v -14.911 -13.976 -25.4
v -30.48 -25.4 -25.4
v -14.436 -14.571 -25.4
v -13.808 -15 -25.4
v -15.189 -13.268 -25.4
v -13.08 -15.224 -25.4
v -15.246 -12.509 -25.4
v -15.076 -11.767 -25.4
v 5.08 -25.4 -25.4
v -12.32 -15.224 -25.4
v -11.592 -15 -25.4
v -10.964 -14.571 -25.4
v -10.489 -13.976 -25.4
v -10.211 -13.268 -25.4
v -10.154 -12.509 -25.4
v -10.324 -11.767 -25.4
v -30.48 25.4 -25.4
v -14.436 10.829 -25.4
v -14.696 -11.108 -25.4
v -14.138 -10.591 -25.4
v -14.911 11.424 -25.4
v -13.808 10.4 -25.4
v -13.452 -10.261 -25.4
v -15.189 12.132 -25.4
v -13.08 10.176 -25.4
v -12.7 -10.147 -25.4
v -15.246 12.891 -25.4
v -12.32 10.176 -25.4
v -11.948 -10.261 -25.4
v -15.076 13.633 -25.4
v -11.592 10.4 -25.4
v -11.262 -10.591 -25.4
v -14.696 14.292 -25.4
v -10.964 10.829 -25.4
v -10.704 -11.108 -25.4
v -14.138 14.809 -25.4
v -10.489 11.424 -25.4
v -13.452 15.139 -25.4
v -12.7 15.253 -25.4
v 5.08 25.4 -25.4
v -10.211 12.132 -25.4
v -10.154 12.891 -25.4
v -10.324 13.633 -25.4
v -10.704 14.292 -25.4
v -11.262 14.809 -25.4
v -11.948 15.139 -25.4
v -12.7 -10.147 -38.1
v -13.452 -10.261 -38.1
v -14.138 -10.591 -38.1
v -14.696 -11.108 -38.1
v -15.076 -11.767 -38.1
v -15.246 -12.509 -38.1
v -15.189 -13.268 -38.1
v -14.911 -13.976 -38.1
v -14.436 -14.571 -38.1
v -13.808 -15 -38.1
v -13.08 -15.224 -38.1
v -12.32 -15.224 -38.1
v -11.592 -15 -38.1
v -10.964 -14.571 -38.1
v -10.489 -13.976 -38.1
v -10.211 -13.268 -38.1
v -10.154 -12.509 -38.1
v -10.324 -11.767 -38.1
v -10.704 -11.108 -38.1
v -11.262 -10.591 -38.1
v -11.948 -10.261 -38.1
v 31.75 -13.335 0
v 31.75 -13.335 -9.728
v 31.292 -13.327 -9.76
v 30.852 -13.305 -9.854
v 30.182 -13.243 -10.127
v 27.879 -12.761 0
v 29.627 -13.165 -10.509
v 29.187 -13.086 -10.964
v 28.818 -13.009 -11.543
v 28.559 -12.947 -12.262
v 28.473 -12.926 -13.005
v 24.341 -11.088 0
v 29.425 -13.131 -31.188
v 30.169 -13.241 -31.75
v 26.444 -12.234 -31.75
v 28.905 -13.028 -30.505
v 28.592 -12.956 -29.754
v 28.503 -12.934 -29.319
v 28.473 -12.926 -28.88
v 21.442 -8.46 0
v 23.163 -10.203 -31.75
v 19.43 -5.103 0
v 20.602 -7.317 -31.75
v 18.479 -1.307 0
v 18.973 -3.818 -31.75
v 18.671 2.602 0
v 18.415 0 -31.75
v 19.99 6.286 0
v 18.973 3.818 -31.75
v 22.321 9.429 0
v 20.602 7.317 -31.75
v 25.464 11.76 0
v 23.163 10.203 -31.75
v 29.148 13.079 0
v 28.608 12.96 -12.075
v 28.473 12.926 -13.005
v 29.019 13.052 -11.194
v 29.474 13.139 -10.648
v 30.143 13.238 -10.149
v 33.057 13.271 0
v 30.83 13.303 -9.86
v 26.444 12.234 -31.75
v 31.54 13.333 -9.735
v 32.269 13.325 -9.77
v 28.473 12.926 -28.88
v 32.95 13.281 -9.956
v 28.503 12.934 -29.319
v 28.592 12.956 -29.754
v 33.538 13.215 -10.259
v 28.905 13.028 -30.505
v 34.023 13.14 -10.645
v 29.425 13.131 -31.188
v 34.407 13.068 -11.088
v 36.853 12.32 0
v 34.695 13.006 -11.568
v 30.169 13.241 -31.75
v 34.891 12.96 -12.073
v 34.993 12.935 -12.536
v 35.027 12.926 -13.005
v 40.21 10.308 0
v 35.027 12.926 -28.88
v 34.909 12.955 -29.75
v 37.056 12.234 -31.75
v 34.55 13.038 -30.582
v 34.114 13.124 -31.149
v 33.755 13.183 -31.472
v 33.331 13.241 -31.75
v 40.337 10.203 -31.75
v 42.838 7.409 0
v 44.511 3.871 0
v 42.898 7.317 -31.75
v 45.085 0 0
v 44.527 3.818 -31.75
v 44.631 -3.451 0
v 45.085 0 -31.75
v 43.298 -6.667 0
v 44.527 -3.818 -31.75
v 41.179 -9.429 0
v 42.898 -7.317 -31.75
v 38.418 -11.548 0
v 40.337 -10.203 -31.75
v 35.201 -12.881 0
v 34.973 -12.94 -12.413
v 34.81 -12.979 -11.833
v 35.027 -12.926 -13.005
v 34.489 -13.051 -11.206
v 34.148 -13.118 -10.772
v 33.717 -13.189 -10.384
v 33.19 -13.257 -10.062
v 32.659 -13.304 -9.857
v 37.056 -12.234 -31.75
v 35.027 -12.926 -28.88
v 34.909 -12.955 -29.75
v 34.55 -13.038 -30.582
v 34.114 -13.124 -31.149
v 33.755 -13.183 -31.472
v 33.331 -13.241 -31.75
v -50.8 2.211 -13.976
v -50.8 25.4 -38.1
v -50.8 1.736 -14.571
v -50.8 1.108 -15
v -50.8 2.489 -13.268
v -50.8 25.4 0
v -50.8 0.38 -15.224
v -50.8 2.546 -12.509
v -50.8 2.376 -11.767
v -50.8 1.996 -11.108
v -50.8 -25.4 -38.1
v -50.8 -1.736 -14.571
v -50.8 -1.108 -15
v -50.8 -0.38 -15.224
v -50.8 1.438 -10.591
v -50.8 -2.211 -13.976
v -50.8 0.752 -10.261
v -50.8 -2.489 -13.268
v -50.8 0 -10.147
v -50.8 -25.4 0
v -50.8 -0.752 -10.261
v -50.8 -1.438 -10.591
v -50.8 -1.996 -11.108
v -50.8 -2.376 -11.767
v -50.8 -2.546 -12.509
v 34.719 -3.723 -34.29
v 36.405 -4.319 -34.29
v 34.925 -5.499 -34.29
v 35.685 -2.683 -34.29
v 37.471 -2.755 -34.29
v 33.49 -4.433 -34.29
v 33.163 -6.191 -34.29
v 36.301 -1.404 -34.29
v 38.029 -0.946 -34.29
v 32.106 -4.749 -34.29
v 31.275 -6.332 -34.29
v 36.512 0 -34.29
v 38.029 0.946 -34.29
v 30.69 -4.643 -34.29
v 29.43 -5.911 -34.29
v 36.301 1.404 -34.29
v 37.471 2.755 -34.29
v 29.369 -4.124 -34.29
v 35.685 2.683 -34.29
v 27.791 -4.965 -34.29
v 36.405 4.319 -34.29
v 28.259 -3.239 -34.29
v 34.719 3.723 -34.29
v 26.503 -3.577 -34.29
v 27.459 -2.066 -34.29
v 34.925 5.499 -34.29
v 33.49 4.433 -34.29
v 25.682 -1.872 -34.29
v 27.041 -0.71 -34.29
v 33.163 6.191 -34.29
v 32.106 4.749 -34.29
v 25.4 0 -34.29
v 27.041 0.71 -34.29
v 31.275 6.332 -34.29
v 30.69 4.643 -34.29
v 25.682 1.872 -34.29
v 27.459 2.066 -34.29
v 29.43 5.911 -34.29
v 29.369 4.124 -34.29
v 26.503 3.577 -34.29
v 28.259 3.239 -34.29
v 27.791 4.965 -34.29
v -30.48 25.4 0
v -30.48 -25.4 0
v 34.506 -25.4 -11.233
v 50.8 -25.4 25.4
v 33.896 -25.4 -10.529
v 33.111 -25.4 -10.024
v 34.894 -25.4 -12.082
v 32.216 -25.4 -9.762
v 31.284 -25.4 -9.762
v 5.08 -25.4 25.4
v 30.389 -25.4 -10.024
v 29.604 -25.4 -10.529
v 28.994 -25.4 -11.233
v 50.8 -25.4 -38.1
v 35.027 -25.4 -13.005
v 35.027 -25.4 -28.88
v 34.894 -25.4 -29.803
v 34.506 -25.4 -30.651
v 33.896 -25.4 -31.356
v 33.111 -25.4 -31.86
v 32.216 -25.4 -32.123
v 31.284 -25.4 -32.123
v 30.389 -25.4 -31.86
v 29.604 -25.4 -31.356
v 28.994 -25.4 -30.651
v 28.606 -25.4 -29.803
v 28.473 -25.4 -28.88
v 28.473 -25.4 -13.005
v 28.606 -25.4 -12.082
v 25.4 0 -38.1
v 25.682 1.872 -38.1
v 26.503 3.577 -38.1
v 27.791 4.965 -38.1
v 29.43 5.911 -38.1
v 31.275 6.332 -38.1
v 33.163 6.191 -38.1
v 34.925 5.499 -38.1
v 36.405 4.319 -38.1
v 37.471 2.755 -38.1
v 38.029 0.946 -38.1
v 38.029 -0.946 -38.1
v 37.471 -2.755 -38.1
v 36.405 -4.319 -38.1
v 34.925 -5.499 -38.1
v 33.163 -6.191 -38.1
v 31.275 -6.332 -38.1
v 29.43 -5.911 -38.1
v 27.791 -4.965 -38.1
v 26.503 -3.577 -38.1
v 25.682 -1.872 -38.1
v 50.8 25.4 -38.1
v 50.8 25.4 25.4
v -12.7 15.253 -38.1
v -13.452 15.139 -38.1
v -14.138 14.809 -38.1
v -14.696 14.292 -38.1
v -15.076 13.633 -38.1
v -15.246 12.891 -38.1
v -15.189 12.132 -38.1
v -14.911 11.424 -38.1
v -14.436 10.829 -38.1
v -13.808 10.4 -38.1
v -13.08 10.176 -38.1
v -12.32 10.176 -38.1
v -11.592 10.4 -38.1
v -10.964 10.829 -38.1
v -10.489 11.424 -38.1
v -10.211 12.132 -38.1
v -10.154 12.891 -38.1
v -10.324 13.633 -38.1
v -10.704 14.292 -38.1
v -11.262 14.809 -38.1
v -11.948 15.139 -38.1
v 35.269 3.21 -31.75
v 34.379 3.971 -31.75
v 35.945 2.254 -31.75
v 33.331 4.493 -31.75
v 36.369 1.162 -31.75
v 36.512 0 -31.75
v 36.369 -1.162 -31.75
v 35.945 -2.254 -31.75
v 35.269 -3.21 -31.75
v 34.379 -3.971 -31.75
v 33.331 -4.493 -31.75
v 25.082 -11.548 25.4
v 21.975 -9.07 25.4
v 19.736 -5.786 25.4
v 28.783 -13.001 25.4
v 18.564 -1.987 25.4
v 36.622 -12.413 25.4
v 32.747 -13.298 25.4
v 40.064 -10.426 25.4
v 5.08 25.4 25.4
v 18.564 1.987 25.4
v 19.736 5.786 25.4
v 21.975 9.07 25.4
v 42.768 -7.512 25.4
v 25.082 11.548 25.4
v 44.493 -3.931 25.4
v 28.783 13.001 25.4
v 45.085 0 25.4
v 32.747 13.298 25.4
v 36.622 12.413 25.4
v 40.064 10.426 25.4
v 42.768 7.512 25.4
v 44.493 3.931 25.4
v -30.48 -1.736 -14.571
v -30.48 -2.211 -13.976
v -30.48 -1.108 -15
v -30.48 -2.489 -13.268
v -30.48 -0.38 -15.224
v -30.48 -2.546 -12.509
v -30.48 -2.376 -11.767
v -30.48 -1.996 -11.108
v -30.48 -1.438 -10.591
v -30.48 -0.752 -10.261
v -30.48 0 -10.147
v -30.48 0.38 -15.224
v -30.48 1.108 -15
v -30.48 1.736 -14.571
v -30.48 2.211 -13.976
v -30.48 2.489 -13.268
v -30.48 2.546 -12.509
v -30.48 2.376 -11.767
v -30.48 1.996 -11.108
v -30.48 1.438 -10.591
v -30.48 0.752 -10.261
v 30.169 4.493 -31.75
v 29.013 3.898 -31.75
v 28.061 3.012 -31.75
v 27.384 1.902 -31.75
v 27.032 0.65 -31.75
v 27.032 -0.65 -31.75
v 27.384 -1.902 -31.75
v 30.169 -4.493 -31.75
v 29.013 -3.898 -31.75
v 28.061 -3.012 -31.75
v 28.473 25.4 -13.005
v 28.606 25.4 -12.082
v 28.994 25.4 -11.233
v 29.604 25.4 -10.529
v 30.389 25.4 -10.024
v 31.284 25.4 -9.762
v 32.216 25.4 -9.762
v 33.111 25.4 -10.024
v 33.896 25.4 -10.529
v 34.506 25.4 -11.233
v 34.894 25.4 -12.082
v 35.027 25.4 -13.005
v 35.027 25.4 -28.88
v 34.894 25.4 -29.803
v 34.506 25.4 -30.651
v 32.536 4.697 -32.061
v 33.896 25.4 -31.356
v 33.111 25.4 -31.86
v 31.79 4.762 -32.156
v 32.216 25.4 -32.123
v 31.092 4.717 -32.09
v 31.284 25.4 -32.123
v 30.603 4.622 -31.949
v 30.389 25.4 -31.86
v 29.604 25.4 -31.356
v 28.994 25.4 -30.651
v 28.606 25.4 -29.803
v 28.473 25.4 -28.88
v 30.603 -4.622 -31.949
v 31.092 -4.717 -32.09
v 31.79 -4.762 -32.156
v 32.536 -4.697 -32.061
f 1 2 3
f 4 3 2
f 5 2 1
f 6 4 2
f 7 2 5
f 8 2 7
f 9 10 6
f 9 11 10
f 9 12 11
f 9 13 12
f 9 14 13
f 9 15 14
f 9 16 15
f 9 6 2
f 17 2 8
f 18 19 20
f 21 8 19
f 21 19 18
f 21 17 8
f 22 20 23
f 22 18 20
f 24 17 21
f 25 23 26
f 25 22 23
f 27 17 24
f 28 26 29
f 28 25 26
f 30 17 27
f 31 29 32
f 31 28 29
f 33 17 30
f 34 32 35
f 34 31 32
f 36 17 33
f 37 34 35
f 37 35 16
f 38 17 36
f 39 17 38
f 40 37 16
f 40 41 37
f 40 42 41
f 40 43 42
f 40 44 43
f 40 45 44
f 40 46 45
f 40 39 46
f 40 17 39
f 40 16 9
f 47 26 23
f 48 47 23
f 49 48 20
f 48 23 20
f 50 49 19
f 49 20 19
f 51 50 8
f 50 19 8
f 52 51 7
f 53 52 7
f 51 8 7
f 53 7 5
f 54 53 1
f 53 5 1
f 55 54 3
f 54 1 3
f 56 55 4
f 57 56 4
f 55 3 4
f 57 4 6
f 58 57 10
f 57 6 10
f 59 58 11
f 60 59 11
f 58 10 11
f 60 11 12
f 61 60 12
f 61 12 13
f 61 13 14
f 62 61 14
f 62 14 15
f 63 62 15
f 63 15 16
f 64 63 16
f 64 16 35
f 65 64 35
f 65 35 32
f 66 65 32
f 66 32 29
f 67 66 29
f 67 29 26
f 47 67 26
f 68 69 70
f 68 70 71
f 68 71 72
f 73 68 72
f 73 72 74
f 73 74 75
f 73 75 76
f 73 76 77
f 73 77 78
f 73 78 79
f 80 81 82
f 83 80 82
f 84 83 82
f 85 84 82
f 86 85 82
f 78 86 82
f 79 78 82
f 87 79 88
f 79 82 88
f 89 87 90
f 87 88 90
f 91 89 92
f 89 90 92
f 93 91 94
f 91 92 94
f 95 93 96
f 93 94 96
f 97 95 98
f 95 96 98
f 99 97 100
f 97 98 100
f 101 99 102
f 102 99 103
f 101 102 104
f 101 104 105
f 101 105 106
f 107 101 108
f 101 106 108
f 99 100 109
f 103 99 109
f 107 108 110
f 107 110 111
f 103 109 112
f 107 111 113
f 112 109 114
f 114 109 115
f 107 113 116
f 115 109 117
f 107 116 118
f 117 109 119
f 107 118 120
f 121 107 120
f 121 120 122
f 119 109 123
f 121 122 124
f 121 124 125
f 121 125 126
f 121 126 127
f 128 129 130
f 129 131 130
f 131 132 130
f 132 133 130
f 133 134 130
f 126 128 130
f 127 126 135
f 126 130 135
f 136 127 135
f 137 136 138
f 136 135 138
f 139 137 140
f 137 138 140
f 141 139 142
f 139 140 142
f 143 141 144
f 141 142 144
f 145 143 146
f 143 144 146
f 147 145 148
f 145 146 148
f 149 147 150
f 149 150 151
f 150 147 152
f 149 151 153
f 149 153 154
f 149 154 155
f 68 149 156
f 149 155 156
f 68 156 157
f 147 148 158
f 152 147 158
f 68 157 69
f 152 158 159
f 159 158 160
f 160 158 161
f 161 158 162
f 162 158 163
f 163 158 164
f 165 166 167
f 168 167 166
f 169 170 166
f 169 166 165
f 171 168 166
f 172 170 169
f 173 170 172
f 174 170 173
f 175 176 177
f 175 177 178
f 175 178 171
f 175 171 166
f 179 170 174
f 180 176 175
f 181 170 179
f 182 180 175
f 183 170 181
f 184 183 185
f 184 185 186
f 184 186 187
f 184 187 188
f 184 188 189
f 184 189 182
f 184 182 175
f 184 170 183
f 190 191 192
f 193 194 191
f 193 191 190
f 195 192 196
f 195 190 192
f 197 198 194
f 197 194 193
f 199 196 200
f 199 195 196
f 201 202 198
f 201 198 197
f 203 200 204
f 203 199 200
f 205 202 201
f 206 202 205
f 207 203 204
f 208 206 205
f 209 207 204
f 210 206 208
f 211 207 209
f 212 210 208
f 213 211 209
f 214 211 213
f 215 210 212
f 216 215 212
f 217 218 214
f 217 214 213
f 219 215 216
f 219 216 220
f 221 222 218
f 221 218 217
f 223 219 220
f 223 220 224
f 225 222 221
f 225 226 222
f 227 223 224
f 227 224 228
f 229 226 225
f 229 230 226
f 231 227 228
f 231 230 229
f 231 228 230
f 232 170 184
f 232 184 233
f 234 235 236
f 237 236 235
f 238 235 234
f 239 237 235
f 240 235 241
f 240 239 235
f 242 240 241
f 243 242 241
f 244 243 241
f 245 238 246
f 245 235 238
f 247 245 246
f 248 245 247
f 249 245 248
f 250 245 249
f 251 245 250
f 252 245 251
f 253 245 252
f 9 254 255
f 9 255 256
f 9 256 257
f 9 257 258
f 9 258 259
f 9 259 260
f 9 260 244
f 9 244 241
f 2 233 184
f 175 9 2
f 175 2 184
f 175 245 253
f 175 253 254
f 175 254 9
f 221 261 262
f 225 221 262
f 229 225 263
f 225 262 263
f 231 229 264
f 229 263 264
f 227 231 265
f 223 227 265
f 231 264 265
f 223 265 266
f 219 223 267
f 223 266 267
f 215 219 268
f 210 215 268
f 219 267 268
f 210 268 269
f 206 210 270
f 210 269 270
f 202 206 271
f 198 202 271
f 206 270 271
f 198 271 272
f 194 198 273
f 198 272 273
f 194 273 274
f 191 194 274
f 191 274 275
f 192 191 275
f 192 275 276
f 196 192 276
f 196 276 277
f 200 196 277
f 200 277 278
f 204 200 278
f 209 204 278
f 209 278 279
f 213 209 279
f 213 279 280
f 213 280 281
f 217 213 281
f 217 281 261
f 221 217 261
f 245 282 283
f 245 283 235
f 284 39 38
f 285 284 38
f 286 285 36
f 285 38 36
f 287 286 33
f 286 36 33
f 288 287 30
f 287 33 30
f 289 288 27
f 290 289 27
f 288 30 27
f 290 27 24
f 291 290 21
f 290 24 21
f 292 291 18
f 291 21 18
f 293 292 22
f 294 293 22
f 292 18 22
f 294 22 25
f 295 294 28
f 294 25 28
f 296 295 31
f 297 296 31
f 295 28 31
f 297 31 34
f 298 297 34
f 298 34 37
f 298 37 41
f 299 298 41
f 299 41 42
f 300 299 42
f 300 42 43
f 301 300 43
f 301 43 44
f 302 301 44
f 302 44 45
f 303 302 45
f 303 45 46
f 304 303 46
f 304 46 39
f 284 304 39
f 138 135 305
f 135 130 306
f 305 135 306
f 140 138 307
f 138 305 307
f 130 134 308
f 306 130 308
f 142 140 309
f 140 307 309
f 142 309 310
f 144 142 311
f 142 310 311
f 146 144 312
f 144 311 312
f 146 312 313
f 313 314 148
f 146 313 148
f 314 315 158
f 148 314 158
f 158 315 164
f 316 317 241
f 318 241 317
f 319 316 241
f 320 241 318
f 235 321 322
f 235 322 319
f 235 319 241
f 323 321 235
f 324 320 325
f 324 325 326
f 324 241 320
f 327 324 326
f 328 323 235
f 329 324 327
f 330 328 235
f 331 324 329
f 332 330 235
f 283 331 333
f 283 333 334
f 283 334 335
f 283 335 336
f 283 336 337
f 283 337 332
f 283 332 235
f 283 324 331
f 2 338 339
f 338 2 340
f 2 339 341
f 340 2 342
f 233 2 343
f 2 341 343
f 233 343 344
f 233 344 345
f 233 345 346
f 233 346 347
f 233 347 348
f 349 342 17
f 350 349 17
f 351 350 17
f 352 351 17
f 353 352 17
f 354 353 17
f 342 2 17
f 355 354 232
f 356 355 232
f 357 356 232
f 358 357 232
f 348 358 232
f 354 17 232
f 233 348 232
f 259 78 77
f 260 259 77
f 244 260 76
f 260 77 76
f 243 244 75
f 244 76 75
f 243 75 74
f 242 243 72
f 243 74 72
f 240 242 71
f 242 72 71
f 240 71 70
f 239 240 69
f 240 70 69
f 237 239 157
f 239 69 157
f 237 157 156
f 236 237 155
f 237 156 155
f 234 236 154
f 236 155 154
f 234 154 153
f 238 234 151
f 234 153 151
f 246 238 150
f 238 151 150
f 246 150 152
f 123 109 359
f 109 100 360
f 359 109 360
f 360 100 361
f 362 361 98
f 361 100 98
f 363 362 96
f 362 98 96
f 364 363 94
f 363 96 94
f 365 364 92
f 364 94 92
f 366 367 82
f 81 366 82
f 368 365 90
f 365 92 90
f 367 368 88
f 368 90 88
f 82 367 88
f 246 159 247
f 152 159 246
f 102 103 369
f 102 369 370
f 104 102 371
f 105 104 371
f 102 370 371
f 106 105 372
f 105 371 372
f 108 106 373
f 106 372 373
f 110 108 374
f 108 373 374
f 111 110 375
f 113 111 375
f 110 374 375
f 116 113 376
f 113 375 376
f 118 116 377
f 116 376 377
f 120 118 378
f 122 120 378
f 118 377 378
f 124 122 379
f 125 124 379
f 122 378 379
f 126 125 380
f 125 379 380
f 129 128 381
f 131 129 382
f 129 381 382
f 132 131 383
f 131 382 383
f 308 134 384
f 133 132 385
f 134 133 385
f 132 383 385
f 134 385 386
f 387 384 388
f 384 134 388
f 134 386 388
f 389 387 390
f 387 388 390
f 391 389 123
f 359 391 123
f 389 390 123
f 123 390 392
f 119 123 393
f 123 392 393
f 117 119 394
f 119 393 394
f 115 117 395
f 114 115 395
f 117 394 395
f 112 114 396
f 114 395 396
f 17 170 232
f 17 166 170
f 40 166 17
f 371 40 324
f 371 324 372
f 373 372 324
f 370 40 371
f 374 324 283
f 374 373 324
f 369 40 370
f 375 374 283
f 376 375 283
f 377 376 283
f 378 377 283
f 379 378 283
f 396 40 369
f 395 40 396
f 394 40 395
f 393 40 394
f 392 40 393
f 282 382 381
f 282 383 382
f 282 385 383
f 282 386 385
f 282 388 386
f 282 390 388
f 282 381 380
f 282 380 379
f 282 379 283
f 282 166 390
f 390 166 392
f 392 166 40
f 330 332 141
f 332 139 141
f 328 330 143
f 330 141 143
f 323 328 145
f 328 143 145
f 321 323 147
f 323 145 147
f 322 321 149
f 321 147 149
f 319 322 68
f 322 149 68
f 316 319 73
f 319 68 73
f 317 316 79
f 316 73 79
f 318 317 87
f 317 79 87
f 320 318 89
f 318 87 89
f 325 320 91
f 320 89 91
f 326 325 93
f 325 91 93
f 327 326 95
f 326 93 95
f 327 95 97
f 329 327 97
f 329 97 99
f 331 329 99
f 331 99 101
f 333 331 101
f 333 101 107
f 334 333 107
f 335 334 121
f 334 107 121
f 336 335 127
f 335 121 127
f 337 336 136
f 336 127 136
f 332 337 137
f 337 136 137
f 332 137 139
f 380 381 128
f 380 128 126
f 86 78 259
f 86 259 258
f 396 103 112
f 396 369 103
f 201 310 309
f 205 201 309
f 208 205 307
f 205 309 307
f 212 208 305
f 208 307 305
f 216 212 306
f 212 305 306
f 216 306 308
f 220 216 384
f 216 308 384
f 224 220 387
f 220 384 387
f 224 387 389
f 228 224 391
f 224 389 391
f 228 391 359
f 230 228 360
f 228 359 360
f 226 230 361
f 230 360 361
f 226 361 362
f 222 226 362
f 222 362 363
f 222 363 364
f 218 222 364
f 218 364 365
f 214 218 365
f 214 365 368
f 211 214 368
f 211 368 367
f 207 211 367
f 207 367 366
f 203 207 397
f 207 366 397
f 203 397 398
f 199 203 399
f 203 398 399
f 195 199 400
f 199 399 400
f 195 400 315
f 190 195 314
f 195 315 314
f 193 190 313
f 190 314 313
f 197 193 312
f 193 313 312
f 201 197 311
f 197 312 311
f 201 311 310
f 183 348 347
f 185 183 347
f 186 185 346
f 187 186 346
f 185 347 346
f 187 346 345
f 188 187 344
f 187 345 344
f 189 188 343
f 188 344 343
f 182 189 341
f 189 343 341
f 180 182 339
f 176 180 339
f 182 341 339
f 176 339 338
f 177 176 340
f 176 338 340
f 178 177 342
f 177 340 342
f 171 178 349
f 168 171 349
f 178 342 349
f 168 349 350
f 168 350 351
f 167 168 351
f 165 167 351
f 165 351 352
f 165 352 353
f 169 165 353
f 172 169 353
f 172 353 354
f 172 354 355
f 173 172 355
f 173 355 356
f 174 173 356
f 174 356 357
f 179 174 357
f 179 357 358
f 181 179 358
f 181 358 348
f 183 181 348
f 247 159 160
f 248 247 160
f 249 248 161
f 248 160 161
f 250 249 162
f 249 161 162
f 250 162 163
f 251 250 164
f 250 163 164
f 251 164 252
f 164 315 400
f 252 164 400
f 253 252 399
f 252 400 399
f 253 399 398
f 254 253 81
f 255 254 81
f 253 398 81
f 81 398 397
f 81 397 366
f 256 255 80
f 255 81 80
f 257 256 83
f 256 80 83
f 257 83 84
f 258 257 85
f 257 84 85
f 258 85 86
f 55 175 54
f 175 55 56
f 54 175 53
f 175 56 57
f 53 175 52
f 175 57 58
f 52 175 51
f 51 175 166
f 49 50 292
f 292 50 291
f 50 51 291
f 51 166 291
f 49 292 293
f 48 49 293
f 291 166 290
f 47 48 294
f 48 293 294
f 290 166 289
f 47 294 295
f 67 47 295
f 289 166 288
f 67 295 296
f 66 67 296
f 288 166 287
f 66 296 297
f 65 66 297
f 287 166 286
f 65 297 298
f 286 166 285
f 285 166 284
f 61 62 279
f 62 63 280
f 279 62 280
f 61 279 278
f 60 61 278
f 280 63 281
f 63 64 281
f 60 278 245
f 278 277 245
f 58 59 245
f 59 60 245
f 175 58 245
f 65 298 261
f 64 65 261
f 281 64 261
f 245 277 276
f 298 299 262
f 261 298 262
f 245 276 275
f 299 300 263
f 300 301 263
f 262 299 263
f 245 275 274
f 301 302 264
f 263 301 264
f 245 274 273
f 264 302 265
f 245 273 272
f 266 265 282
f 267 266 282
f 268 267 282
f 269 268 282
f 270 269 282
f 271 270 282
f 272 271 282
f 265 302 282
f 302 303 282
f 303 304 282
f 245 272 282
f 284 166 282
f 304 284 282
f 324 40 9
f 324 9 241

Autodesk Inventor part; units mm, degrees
ref_plane "YZ Plane" through (0, 0, 0) normal (1, 0, 0) x (0, 1, 0)
ref_plane "XZ Plane" through (0, 0, 0) normal (0, 1, 0) x (-1, 0, 0)
ref_plane "XY Plane" through (0, 0, 0) normal (0, 0, 1) x (1, 0, 0)
sketch "Sketch1" plane through (0, 0, 0) normal (0, 0, 1) x (1, 0, 0)
  line L0 (-50.8, -25.4) -> (50.8, -25.4)
  line L1 (50.8, -25.4) -> (50.8, 25.4)
  line L2 (50.8, 25.4) -> (-50.8, 25.4)
  line L3 (-50.8, 25.4) -> (-50.8, -25.4)
  line L4 (-50.8, -25.4) -> (50.8, 25.4) construction
  line L5 (50.8, -25.4) -> (-50.8, 25.4) construction
  point P0 (0, 0)
  dimension "d0" = 50.8
  dimension "d1" = 101.6
extrude "Extrusion1" add sketch "Sketch1" against normal blind 38.1
sketch "Sketch2" plane through (0, 0, 0) normal (0, 0, 1) x (1, 0, 0)
  line L0 (-50.8, 25.4) -> (50.8, 25.4) projected
  line L1 (50.8, -25.4) -> (-50.8, -25.4) projected
  line L2 (-25.4, 25.4) -> (0, 25.4)
  line L3 (0, 25.4) -> (0, -25.4)
  line L4 (0, -25.4) -> (-25.4, -25.4)
  line L5 (-25.4, -25.4) -> (-25.4, 25.4)
  line L6 (-50.8, 25.4) -> (-50.8, -25.4) projected
  point P0 (0, 0)
  dimension "d4" = 25.4
  dimension "d5" = 25.4
extrude "Extrusion2" cut sketch "Sketch2" against normal blind 25.4 contours L0 L3 L1 L5
sketch "Sketch3" plane through (0, 0, 0) normal (0, 0, 1) x (1, 0, 0)
  line L0 (0, 25.4) -> (0, -25.4) projected
  point P0 (0, 0)
  point P1 (31.75, 0)
  dimension "d8" = 31.75
hole "Hole1" at (31.75, 0, 0) direction (0, 0, -1) diameter 26.67 depth 31.75
sketch "Sketch4" plane through (31.75, 0, -31.75) normal (0, 0, 1) x (1, 0, 0)
  circle A0 centre (0, 0) radius 4.7625
  point P0 (-31.75, 0)
  dimension "d16" = 9.525
extrude "Extrusion3" cut sketch "Sketch4" against normal through all
sketch "Sketch5" plane through (-50.8, 25.4, -38.1) normal (0, 1, 0) x (1, 0, 0)
  line L0 (114.3, -38.1) -> (50.8, -38.1) construction
  line L1 (82.55, -38.1) -> (82.55, 0) construction
  line L2 (0, 0) -> (101.6, 0) construction
  line L3 (50.8, -12.7) -> (50.8, -38.1) projected
  line L4 (82.55, -9.2202) -> (82.55, -25.0952) construction
  line L5 (85.8266, -9.2202) -> (85.8266, -25.0952)
  line L6 (79.2734, -25.0952) -> (79.2734, -9.2202)
  arc A0 (85.8266, -9.2202) -> (79.2734, -9.2202) centre (82.55, -9.2202) ccw
  arc A1 (79.2734, -25.0952) -> (85.8266, -25.0952) centre (82.55, -25.0952) ccw
  point P0 (82.55, -15.5702)
  point P1 (82.55, -17.1577)
  dimension "d19" = 15.5702
  dimension "d44" = 31.75
  dimension "d64" = 6.35
  dimension "d65" = 6.5532
  dimension "d66" = 9.525
sketch "Sketch6" plane through (0, 0, -38.1) normal (0, 0, -1) x (-1, 0, 0)
  line L0 (25.4, 25.4) -> (0, 25.4) construction
  line L1 (12.7, 25.4) -> (12.7, -25.4) construction
  line L2 (-50.8, -25.4) -> (50.8, -25.4) construction
  point P0 (0, 0)
  point P1 (12.7, 12.7)
  point P2 (12.7, -12.7)
  dimension "d27" = 12.7
  dimension "d28" = 12.7
hole "Hole3" at (-12.7, 12.7, -38.1) at (-12.7, -12.7, -38.1) direction (0, 0, 1) diameter 5.1054 end through all
sketch "Sketch7" plane through (-50.8, -25.4, 0) normal (-1, 0, 0) x (0, 0, 1)
  line L0 (0, 50.8) -> (-38.1, 50.8) construction
  line L1 (-12.7, 50.8) -> (-12.7, 0) construction
  line L2 (0, 0) -> (-38.1, 0) construction
  point P0 (0, 25.4)
  point P1 (-25.4, 50.8)
  point P2 (-12.7, 25.4)
  dimension "d36" = 12.7
hole "Hole4" at (-50.8, 0, -12.7) direction (1, 0, 0) diameter 5.1054 end up to surface clearance for "Flat Head Machine Screw (82)" size "#10" standard "Ansi Unified Screw Threads"
sketch "Sketch8" plane through (0, 0, 0) normal (0, 0, 1) x (1, 0, 0)
  point P0 (0, 0)
sketch "Sketch9" plane through (0, 0, 0) normal (0, 0, 1) x (1, 0, 0)
  line L0 (-25.4, 25.4) -> (0, 25.4) projected
  line L1 (50.8, 25.4) -> (50.8, -25.4) projected
  line L2 (0, 25.4) -> (50.8, 25.4)
  line L3 (50.8, 25.4) -> (50.8, -25.4)
  line L4 (50.8, -25.4) -> (0, -25.4)
  line L5 (0, -25.4) -> (0, 25.4)
  circle A0 centre (31.75, 0) radius 13.335 projected
  circle A1 centre (31.75, 0) radius 13.335
  point P0 (0, 0)
extrude "Extrusion4" add sketch "Sketch9" along normal blind 41.275
sketch "Sketch10" plane through (-50.8, 25.4, -38.1) normal (0, 1, 0) x (1, 0, 0)
  line L0 (77.7875, 0) -> (87.3125, 0) construction
  line L1 (82.55, 0) -> (82.55, -79.375) construction
  line L2 (50.8, -79.375) -> (101.6, -79.375) construction
  point P0 (50.8, -38.1)
  point P1 (82.55, -69.85)
  dimension "d47" = 9.525
hole "Hole5" at (31.75, 25.4, 31.75) direction (0, -1, 0) diameter 5.7912 end through all clearance for "Flat Head Machine Screw (82)" size "#12" standard "Ansi Unified Screw Threads"
sketch "Sketch11" plane through (0, 0, -38.1) normal (0, 0, -1) x (-1, 0, 0)
  circle A0 centre (-31.75, 0) radius 4.7625 projected
  circle A1 centre (-31.75, 0) radius 6.35
  point P0 (0, 0)
  dimension "d55" = 12.7
extrude "Extrusion5" cut sketch "Sketch11" against normal blind 3.81
sketch "Sketch13" plane through (0, 0, 41.275) normal (0, 0, 1) x (1, 0, 0)
  line L0 (50.8, -25.4) -> (-50.8, -25.4) projected
  line L1 (0, 25.4) -> (0, -25.4) projected
  line L2 (50.8, -25.4) -> (0, -25.4)
  line L3 (0, -25.4) -> (0, 25.4)
  line L4 (0, 25.4) -> (50.8, 25.4)
  line L5 (50.8, 25.4) -> (50.8, -25.4)
  point P0 (0, 0)
extrude "Extrusion6" cut sketch "Sketch13" against normal blind 15.875
sketch "Sketch16" plane through (-50.8, 25.4, -38.1) normal (0, 1, 0) x (1, 0, 0)
  line L0 (25.4, -38.1) -> (0, -38.1) projected
  line L1 (25.4, -12.7) -> (20.32, -12.7)
  line L2 (20.32, -12.7) -> (20.32, -38.1)
  line L3 (20.32, -38.1) -> (25.4, -38.1)
  line L4 (25.4, -38.1) -> (25.4, -12.7)
  line L5 (50.8, -12.7) -> (50.8, -63.5) projected
  line L6 (101.6, -63.5) -> (50.8, -63.5) projected
  line L7 (50.8, -12.7) -> (55.88, -12.7)
  line L8 (55.88, -12.7) -> (55.88, -63.5)
  line L9 (55.88, -63.5) -> (50.8, -63.5)
  line L10 (50.8, -63.5) -> (50.8, -12.7)
  point P0 (50.8, -38.1)
  dimension "d60" = 5.08
  dimension "d61" = 5.08
extrude "Extrusion7" cut sketch "Sketch16" against normal through all
extrude "Extrusion8" cut sketch "Sketch5" against normal through all
equation "\"d0\" = height"
equation "\"d1\" = width"
equation "\"d2\" = depth"
equation "\"d6\" = slotFor1x1"
equation "\"d8\" = centerOfMotorShaft"
equation "\"d9\" = shaftDiameter + clearanceForRotation"
equation "\"d44\" = centerOfMotorShaft"
equation "\"width\" = 101.6"
equation "\"height\" = 50.8"
equation "\"depth\" = 38.1"
equation "\"shaftDiameter\" = 25.4"
equation "\"centerOfMotorShaft\" = 31.75"
equation "\"clearanceForRotation\" = 1.27"
equation "\"widthOfCChannel\" = 31.75"
equation "\"slotFor1x1\" = 25.4"
properties part number "blockToSupportShaftAndPot" material "Aluminum 6061"
